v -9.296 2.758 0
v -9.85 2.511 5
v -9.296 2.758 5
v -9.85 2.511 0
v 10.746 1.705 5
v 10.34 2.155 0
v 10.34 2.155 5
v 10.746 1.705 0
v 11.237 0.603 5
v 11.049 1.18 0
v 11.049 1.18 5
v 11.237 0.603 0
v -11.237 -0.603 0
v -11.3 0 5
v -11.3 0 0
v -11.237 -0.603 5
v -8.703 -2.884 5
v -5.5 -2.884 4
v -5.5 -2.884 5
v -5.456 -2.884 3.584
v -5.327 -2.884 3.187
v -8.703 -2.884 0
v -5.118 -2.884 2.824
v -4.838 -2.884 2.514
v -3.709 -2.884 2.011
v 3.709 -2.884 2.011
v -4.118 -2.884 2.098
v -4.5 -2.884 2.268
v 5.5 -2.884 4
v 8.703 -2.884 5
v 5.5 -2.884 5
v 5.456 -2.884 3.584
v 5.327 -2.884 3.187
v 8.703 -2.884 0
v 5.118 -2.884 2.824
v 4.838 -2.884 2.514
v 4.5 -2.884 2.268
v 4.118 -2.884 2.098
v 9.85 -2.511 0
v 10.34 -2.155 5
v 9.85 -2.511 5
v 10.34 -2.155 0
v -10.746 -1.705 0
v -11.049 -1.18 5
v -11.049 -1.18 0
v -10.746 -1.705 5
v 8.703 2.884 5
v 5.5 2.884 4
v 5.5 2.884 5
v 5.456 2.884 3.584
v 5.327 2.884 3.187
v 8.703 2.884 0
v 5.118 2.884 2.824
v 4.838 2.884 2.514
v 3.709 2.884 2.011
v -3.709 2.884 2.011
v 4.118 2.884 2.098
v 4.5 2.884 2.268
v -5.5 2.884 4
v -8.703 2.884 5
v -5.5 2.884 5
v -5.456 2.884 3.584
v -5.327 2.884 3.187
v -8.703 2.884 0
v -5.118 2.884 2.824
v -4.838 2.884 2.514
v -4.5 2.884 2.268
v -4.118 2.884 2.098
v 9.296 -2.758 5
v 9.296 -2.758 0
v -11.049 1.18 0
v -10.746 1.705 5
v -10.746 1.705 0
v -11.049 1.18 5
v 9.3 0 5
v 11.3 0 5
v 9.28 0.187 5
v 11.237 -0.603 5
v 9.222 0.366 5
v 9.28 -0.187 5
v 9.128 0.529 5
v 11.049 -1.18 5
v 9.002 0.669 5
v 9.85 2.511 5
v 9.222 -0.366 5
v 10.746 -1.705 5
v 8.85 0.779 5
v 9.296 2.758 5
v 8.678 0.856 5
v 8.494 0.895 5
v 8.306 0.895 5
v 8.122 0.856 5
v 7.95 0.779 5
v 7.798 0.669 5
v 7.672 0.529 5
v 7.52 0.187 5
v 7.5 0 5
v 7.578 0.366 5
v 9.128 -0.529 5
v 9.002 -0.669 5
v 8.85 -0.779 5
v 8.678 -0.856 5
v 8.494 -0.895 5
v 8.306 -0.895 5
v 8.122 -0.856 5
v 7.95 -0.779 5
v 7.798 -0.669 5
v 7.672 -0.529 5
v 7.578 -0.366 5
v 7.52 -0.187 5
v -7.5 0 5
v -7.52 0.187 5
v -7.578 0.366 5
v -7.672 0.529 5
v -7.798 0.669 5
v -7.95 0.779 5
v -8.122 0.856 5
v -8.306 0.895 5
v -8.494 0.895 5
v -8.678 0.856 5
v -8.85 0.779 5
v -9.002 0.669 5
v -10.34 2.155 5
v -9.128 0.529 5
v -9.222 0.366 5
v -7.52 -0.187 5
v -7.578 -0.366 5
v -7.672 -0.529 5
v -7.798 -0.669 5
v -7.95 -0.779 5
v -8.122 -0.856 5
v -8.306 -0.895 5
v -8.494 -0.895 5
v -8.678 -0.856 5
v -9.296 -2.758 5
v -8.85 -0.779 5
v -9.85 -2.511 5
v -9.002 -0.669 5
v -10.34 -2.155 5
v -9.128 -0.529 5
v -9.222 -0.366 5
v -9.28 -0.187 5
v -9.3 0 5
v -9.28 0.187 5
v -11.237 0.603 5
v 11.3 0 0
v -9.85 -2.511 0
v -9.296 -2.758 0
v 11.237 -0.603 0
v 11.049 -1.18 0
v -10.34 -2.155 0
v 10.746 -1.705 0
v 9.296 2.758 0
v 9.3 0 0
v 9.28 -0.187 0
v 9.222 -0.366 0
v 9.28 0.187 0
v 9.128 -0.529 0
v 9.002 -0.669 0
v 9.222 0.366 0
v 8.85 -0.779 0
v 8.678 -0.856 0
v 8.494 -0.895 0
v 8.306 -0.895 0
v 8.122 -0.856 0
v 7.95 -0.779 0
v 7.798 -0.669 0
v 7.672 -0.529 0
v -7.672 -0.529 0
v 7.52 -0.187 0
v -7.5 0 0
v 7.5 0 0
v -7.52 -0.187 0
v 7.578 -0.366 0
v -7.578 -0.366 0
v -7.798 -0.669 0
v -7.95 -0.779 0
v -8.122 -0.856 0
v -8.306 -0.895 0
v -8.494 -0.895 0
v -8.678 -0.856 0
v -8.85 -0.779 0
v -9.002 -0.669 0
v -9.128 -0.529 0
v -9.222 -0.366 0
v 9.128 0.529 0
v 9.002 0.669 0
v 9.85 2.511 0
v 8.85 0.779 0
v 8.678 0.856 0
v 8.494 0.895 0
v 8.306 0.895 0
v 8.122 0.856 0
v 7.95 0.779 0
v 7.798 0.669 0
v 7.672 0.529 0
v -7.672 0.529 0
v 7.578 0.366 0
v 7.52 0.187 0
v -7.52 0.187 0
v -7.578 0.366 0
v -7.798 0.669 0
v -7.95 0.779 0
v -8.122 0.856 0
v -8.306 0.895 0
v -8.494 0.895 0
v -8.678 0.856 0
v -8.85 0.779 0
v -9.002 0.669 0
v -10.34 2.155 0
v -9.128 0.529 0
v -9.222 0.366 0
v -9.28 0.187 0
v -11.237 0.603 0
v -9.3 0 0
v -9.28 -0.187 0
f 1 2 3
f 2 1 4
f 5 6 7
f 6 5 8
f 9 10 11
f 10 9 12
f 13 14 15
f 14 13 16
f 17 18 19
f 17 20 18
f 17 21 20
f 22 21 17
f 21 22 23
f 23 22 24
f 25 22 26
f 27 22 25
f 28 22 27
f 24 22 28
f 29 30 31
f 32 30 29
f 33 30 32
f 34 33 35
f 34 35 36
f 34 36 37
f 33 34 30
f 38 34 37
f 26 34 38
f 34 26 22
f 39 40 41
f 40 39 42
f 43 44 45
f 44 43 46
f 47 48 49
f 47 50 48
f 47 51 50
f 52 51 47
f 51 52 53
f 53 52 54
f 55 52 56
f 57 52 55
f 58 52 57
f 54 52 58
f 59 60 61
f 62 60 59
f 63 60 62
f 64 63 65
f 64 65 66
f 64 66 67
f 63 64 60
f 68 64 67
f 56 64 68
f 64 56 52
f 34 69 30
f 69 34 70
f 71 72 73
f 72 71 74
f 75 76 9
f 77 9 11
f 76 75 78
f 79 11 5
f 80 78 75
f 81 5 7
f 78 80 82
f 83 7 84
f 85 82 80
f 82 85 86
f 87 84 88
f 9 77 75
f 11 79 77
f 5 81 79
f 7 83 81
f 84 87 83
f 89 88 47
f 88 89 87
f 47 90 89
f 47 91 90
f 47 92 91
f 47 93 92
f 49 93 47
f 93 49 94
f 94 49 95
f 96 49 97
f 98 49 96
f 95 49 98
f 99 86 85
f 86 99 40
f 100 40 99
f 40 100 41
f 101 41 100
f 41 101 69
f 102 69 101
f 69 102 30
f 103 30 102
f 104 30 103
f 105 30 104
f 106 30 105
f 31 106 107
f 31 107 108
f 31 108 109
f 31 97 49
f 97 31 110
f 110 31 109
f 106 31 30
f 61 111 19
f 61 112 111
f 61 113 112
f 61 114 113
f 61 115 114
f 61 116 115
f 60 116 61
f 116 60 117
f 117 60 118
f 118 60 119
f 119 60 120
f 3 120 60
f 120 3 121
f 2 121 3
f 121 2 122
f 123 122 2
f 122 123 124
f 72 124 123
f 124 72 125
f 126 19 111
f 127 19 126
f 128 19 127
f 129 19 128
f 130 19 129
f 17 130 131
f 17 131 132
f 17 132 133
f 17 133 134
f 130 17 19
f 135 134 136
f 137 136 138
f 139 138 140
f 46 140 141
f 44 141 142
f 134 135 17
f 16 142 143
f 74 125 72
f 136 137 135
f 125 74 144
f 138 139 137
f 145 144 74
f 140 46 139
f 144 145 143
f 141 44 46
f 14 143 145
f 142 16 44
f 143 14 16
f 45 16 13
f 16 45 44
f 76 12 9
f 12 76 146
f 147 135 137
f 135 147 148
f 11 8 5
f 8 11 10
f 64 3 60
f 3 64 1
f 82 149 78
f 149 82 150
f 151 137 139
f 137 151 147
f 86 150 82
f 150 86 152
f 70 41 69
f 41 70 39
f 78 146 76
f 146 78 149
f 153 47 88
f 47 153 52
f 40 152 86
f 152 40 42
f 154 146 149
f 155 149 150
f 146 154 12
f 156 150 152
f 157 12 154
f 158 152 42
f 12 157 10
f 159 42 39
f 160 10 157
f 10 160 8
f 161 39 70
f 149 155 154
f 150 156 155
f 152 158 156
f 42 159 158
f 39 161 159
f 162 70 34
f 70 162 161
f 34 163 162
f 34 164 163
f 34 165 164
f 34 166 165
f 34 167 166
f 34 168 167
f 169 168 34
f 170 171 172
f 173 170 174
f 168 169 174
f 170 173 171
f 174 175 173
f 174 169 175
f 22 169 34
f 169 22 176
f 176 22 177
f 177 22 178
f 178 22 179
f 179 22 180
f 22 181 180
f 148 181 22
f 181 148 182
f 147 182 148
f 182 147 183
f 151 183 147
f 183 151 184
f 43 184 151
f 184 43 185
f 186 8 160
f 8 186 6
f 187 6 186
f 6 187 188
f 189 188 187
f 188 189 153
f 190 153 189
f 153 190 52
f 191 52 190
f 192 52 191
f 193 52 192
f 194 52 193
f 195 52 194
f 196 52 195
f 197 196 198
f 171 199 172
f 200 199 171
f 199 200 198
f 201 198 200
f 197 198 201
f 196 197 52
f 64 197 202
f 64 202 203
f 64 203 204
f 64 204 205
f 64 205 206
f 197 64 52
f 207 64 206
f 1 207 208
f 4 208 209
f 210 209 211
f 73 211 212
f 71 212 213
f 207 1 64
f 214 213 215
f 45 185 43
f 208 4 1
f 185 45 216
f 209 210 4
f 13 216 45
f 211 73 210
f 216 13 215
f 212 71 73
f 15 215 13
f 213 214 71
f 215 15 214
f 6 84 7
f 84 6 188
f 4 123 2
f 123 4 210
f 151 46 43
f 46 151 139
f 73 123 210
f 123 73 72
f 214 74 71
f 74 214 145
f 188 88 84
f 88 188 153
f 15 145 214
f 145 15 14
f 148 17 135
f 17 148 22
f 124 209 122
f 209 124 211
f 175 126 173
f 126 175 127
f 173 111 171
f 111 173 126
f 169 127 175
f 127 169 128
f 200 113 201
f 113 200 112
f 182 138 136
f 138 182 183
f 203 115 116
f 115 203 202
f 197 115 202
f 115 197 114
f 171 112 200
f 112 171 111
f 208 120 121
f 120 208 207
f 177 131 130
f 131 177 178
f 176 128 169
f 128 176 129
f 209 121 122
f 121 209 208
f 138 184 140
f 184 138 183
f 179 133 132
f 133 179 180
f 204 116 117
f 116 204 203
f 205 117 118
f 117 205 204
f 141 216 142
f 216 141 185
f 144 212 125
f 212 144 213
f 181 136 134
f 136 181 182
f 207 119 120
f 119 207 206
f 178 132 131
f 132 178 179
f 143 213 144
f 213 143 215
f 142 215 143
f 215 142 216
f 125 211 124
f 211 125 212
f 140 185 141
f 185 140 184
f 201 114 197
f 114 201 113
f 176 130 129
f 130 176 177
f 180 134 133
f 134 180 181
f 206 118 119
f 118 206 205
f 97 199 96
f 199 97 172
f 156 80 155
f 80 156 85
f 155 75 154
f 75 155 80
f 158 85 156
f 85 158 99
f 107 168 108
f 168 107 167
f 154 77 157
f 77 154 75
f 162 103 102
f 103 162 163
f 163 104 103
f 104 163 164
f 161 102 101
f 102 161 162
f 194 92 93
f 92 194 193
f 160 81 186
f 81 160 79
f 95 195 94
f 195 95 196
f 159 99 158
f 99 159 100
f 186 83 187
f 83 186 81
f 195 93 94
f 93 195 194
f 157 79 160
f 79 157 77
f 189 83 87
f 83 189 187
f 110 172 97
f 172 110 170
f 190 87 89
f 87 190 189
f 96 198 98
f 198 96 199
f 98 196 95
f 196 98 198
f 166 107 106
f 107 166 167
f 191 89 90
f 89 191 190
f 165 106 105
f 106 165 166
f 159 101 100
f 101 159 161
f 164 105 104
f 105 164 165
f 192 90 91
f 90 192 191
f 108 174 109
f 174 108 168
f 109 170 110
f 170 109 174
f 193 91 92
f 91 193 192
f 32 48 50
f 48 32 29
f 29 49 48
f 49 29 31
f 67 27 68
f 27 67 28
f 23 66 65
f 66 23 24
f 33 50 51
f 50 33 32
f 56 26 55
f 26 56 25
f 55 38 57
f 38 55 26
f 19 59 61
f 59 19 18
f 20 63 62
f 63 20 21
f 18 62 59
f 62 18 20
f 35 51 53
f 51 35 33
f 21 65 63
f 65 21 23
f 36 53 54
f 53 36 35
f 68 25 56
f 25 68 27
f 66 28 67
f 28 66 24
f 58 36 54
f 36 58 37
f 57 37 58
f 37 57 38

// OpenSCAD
/* [Hidden] */
$fn=30;

/* [Parameters] */
//nail diameter plus extra for hole dialation (add 0.6 for most printers)
nail_diameter = 1.8;
//width of the staple opening
staple_spacing = 11;
//depth of the staple opening
staple_cutout_depth = 3;

/* [Advanced Parameters] */
//radius of staple cutout
staple_radius = 2;
//thickness around nail hole
thickness = 2;
//thickness above cutout
top_thickness = 2;

ct = nail_diameter+2*thickness;
translate([-staple_spacing/2-ct/2,0,staple_cutout_depth+top_thickness])
rotate([180,0,0])
difference() {
	$fn=30;
	hull() {
		cylinder(d=ct,h=staple_cutout_depth+top_thickness);
		translate([staple_spacing+ct,0 ,0 ])
		cylinder(d=ct,h=staple_cutout_depth+top_thickness);
	}
	cylinder(d=nail_diameter,h=3*(staple_cutout_depth+thickness),center=true);
	translate([staple_spacing+ct,0 ,0 ])
	cylinder(d=nail_diameter,h=3*(staple_cutout_depth+thickness),center=true);
	hull() {
		translate([ct/2+staple_radius,0,staple_cutout_depth-staple_radius])
		rotate([90,0,0])
		cylinder(r=staple_radius,h=ct+5 , center=true);
		translate([ct/2-staple_radius+staple_spacing,0,staple_cutout_depth-staple_radius])
		rotate([90,0,0])
		cylinder(r=staple_radius,h=ct+5 , center=true);
		translate([ct/2+staple_radius,0, 0])
		rotate([90,0,0])
		cylinder(r=staple_radius,h=ct+5 , center=true);
		translate([ct/2-staple_radius+staple_spacing,0,0])
		rotate([90,0,0])
		cylinder(r=staple_radius,h=ct+5 , center=true);;
	}
}
